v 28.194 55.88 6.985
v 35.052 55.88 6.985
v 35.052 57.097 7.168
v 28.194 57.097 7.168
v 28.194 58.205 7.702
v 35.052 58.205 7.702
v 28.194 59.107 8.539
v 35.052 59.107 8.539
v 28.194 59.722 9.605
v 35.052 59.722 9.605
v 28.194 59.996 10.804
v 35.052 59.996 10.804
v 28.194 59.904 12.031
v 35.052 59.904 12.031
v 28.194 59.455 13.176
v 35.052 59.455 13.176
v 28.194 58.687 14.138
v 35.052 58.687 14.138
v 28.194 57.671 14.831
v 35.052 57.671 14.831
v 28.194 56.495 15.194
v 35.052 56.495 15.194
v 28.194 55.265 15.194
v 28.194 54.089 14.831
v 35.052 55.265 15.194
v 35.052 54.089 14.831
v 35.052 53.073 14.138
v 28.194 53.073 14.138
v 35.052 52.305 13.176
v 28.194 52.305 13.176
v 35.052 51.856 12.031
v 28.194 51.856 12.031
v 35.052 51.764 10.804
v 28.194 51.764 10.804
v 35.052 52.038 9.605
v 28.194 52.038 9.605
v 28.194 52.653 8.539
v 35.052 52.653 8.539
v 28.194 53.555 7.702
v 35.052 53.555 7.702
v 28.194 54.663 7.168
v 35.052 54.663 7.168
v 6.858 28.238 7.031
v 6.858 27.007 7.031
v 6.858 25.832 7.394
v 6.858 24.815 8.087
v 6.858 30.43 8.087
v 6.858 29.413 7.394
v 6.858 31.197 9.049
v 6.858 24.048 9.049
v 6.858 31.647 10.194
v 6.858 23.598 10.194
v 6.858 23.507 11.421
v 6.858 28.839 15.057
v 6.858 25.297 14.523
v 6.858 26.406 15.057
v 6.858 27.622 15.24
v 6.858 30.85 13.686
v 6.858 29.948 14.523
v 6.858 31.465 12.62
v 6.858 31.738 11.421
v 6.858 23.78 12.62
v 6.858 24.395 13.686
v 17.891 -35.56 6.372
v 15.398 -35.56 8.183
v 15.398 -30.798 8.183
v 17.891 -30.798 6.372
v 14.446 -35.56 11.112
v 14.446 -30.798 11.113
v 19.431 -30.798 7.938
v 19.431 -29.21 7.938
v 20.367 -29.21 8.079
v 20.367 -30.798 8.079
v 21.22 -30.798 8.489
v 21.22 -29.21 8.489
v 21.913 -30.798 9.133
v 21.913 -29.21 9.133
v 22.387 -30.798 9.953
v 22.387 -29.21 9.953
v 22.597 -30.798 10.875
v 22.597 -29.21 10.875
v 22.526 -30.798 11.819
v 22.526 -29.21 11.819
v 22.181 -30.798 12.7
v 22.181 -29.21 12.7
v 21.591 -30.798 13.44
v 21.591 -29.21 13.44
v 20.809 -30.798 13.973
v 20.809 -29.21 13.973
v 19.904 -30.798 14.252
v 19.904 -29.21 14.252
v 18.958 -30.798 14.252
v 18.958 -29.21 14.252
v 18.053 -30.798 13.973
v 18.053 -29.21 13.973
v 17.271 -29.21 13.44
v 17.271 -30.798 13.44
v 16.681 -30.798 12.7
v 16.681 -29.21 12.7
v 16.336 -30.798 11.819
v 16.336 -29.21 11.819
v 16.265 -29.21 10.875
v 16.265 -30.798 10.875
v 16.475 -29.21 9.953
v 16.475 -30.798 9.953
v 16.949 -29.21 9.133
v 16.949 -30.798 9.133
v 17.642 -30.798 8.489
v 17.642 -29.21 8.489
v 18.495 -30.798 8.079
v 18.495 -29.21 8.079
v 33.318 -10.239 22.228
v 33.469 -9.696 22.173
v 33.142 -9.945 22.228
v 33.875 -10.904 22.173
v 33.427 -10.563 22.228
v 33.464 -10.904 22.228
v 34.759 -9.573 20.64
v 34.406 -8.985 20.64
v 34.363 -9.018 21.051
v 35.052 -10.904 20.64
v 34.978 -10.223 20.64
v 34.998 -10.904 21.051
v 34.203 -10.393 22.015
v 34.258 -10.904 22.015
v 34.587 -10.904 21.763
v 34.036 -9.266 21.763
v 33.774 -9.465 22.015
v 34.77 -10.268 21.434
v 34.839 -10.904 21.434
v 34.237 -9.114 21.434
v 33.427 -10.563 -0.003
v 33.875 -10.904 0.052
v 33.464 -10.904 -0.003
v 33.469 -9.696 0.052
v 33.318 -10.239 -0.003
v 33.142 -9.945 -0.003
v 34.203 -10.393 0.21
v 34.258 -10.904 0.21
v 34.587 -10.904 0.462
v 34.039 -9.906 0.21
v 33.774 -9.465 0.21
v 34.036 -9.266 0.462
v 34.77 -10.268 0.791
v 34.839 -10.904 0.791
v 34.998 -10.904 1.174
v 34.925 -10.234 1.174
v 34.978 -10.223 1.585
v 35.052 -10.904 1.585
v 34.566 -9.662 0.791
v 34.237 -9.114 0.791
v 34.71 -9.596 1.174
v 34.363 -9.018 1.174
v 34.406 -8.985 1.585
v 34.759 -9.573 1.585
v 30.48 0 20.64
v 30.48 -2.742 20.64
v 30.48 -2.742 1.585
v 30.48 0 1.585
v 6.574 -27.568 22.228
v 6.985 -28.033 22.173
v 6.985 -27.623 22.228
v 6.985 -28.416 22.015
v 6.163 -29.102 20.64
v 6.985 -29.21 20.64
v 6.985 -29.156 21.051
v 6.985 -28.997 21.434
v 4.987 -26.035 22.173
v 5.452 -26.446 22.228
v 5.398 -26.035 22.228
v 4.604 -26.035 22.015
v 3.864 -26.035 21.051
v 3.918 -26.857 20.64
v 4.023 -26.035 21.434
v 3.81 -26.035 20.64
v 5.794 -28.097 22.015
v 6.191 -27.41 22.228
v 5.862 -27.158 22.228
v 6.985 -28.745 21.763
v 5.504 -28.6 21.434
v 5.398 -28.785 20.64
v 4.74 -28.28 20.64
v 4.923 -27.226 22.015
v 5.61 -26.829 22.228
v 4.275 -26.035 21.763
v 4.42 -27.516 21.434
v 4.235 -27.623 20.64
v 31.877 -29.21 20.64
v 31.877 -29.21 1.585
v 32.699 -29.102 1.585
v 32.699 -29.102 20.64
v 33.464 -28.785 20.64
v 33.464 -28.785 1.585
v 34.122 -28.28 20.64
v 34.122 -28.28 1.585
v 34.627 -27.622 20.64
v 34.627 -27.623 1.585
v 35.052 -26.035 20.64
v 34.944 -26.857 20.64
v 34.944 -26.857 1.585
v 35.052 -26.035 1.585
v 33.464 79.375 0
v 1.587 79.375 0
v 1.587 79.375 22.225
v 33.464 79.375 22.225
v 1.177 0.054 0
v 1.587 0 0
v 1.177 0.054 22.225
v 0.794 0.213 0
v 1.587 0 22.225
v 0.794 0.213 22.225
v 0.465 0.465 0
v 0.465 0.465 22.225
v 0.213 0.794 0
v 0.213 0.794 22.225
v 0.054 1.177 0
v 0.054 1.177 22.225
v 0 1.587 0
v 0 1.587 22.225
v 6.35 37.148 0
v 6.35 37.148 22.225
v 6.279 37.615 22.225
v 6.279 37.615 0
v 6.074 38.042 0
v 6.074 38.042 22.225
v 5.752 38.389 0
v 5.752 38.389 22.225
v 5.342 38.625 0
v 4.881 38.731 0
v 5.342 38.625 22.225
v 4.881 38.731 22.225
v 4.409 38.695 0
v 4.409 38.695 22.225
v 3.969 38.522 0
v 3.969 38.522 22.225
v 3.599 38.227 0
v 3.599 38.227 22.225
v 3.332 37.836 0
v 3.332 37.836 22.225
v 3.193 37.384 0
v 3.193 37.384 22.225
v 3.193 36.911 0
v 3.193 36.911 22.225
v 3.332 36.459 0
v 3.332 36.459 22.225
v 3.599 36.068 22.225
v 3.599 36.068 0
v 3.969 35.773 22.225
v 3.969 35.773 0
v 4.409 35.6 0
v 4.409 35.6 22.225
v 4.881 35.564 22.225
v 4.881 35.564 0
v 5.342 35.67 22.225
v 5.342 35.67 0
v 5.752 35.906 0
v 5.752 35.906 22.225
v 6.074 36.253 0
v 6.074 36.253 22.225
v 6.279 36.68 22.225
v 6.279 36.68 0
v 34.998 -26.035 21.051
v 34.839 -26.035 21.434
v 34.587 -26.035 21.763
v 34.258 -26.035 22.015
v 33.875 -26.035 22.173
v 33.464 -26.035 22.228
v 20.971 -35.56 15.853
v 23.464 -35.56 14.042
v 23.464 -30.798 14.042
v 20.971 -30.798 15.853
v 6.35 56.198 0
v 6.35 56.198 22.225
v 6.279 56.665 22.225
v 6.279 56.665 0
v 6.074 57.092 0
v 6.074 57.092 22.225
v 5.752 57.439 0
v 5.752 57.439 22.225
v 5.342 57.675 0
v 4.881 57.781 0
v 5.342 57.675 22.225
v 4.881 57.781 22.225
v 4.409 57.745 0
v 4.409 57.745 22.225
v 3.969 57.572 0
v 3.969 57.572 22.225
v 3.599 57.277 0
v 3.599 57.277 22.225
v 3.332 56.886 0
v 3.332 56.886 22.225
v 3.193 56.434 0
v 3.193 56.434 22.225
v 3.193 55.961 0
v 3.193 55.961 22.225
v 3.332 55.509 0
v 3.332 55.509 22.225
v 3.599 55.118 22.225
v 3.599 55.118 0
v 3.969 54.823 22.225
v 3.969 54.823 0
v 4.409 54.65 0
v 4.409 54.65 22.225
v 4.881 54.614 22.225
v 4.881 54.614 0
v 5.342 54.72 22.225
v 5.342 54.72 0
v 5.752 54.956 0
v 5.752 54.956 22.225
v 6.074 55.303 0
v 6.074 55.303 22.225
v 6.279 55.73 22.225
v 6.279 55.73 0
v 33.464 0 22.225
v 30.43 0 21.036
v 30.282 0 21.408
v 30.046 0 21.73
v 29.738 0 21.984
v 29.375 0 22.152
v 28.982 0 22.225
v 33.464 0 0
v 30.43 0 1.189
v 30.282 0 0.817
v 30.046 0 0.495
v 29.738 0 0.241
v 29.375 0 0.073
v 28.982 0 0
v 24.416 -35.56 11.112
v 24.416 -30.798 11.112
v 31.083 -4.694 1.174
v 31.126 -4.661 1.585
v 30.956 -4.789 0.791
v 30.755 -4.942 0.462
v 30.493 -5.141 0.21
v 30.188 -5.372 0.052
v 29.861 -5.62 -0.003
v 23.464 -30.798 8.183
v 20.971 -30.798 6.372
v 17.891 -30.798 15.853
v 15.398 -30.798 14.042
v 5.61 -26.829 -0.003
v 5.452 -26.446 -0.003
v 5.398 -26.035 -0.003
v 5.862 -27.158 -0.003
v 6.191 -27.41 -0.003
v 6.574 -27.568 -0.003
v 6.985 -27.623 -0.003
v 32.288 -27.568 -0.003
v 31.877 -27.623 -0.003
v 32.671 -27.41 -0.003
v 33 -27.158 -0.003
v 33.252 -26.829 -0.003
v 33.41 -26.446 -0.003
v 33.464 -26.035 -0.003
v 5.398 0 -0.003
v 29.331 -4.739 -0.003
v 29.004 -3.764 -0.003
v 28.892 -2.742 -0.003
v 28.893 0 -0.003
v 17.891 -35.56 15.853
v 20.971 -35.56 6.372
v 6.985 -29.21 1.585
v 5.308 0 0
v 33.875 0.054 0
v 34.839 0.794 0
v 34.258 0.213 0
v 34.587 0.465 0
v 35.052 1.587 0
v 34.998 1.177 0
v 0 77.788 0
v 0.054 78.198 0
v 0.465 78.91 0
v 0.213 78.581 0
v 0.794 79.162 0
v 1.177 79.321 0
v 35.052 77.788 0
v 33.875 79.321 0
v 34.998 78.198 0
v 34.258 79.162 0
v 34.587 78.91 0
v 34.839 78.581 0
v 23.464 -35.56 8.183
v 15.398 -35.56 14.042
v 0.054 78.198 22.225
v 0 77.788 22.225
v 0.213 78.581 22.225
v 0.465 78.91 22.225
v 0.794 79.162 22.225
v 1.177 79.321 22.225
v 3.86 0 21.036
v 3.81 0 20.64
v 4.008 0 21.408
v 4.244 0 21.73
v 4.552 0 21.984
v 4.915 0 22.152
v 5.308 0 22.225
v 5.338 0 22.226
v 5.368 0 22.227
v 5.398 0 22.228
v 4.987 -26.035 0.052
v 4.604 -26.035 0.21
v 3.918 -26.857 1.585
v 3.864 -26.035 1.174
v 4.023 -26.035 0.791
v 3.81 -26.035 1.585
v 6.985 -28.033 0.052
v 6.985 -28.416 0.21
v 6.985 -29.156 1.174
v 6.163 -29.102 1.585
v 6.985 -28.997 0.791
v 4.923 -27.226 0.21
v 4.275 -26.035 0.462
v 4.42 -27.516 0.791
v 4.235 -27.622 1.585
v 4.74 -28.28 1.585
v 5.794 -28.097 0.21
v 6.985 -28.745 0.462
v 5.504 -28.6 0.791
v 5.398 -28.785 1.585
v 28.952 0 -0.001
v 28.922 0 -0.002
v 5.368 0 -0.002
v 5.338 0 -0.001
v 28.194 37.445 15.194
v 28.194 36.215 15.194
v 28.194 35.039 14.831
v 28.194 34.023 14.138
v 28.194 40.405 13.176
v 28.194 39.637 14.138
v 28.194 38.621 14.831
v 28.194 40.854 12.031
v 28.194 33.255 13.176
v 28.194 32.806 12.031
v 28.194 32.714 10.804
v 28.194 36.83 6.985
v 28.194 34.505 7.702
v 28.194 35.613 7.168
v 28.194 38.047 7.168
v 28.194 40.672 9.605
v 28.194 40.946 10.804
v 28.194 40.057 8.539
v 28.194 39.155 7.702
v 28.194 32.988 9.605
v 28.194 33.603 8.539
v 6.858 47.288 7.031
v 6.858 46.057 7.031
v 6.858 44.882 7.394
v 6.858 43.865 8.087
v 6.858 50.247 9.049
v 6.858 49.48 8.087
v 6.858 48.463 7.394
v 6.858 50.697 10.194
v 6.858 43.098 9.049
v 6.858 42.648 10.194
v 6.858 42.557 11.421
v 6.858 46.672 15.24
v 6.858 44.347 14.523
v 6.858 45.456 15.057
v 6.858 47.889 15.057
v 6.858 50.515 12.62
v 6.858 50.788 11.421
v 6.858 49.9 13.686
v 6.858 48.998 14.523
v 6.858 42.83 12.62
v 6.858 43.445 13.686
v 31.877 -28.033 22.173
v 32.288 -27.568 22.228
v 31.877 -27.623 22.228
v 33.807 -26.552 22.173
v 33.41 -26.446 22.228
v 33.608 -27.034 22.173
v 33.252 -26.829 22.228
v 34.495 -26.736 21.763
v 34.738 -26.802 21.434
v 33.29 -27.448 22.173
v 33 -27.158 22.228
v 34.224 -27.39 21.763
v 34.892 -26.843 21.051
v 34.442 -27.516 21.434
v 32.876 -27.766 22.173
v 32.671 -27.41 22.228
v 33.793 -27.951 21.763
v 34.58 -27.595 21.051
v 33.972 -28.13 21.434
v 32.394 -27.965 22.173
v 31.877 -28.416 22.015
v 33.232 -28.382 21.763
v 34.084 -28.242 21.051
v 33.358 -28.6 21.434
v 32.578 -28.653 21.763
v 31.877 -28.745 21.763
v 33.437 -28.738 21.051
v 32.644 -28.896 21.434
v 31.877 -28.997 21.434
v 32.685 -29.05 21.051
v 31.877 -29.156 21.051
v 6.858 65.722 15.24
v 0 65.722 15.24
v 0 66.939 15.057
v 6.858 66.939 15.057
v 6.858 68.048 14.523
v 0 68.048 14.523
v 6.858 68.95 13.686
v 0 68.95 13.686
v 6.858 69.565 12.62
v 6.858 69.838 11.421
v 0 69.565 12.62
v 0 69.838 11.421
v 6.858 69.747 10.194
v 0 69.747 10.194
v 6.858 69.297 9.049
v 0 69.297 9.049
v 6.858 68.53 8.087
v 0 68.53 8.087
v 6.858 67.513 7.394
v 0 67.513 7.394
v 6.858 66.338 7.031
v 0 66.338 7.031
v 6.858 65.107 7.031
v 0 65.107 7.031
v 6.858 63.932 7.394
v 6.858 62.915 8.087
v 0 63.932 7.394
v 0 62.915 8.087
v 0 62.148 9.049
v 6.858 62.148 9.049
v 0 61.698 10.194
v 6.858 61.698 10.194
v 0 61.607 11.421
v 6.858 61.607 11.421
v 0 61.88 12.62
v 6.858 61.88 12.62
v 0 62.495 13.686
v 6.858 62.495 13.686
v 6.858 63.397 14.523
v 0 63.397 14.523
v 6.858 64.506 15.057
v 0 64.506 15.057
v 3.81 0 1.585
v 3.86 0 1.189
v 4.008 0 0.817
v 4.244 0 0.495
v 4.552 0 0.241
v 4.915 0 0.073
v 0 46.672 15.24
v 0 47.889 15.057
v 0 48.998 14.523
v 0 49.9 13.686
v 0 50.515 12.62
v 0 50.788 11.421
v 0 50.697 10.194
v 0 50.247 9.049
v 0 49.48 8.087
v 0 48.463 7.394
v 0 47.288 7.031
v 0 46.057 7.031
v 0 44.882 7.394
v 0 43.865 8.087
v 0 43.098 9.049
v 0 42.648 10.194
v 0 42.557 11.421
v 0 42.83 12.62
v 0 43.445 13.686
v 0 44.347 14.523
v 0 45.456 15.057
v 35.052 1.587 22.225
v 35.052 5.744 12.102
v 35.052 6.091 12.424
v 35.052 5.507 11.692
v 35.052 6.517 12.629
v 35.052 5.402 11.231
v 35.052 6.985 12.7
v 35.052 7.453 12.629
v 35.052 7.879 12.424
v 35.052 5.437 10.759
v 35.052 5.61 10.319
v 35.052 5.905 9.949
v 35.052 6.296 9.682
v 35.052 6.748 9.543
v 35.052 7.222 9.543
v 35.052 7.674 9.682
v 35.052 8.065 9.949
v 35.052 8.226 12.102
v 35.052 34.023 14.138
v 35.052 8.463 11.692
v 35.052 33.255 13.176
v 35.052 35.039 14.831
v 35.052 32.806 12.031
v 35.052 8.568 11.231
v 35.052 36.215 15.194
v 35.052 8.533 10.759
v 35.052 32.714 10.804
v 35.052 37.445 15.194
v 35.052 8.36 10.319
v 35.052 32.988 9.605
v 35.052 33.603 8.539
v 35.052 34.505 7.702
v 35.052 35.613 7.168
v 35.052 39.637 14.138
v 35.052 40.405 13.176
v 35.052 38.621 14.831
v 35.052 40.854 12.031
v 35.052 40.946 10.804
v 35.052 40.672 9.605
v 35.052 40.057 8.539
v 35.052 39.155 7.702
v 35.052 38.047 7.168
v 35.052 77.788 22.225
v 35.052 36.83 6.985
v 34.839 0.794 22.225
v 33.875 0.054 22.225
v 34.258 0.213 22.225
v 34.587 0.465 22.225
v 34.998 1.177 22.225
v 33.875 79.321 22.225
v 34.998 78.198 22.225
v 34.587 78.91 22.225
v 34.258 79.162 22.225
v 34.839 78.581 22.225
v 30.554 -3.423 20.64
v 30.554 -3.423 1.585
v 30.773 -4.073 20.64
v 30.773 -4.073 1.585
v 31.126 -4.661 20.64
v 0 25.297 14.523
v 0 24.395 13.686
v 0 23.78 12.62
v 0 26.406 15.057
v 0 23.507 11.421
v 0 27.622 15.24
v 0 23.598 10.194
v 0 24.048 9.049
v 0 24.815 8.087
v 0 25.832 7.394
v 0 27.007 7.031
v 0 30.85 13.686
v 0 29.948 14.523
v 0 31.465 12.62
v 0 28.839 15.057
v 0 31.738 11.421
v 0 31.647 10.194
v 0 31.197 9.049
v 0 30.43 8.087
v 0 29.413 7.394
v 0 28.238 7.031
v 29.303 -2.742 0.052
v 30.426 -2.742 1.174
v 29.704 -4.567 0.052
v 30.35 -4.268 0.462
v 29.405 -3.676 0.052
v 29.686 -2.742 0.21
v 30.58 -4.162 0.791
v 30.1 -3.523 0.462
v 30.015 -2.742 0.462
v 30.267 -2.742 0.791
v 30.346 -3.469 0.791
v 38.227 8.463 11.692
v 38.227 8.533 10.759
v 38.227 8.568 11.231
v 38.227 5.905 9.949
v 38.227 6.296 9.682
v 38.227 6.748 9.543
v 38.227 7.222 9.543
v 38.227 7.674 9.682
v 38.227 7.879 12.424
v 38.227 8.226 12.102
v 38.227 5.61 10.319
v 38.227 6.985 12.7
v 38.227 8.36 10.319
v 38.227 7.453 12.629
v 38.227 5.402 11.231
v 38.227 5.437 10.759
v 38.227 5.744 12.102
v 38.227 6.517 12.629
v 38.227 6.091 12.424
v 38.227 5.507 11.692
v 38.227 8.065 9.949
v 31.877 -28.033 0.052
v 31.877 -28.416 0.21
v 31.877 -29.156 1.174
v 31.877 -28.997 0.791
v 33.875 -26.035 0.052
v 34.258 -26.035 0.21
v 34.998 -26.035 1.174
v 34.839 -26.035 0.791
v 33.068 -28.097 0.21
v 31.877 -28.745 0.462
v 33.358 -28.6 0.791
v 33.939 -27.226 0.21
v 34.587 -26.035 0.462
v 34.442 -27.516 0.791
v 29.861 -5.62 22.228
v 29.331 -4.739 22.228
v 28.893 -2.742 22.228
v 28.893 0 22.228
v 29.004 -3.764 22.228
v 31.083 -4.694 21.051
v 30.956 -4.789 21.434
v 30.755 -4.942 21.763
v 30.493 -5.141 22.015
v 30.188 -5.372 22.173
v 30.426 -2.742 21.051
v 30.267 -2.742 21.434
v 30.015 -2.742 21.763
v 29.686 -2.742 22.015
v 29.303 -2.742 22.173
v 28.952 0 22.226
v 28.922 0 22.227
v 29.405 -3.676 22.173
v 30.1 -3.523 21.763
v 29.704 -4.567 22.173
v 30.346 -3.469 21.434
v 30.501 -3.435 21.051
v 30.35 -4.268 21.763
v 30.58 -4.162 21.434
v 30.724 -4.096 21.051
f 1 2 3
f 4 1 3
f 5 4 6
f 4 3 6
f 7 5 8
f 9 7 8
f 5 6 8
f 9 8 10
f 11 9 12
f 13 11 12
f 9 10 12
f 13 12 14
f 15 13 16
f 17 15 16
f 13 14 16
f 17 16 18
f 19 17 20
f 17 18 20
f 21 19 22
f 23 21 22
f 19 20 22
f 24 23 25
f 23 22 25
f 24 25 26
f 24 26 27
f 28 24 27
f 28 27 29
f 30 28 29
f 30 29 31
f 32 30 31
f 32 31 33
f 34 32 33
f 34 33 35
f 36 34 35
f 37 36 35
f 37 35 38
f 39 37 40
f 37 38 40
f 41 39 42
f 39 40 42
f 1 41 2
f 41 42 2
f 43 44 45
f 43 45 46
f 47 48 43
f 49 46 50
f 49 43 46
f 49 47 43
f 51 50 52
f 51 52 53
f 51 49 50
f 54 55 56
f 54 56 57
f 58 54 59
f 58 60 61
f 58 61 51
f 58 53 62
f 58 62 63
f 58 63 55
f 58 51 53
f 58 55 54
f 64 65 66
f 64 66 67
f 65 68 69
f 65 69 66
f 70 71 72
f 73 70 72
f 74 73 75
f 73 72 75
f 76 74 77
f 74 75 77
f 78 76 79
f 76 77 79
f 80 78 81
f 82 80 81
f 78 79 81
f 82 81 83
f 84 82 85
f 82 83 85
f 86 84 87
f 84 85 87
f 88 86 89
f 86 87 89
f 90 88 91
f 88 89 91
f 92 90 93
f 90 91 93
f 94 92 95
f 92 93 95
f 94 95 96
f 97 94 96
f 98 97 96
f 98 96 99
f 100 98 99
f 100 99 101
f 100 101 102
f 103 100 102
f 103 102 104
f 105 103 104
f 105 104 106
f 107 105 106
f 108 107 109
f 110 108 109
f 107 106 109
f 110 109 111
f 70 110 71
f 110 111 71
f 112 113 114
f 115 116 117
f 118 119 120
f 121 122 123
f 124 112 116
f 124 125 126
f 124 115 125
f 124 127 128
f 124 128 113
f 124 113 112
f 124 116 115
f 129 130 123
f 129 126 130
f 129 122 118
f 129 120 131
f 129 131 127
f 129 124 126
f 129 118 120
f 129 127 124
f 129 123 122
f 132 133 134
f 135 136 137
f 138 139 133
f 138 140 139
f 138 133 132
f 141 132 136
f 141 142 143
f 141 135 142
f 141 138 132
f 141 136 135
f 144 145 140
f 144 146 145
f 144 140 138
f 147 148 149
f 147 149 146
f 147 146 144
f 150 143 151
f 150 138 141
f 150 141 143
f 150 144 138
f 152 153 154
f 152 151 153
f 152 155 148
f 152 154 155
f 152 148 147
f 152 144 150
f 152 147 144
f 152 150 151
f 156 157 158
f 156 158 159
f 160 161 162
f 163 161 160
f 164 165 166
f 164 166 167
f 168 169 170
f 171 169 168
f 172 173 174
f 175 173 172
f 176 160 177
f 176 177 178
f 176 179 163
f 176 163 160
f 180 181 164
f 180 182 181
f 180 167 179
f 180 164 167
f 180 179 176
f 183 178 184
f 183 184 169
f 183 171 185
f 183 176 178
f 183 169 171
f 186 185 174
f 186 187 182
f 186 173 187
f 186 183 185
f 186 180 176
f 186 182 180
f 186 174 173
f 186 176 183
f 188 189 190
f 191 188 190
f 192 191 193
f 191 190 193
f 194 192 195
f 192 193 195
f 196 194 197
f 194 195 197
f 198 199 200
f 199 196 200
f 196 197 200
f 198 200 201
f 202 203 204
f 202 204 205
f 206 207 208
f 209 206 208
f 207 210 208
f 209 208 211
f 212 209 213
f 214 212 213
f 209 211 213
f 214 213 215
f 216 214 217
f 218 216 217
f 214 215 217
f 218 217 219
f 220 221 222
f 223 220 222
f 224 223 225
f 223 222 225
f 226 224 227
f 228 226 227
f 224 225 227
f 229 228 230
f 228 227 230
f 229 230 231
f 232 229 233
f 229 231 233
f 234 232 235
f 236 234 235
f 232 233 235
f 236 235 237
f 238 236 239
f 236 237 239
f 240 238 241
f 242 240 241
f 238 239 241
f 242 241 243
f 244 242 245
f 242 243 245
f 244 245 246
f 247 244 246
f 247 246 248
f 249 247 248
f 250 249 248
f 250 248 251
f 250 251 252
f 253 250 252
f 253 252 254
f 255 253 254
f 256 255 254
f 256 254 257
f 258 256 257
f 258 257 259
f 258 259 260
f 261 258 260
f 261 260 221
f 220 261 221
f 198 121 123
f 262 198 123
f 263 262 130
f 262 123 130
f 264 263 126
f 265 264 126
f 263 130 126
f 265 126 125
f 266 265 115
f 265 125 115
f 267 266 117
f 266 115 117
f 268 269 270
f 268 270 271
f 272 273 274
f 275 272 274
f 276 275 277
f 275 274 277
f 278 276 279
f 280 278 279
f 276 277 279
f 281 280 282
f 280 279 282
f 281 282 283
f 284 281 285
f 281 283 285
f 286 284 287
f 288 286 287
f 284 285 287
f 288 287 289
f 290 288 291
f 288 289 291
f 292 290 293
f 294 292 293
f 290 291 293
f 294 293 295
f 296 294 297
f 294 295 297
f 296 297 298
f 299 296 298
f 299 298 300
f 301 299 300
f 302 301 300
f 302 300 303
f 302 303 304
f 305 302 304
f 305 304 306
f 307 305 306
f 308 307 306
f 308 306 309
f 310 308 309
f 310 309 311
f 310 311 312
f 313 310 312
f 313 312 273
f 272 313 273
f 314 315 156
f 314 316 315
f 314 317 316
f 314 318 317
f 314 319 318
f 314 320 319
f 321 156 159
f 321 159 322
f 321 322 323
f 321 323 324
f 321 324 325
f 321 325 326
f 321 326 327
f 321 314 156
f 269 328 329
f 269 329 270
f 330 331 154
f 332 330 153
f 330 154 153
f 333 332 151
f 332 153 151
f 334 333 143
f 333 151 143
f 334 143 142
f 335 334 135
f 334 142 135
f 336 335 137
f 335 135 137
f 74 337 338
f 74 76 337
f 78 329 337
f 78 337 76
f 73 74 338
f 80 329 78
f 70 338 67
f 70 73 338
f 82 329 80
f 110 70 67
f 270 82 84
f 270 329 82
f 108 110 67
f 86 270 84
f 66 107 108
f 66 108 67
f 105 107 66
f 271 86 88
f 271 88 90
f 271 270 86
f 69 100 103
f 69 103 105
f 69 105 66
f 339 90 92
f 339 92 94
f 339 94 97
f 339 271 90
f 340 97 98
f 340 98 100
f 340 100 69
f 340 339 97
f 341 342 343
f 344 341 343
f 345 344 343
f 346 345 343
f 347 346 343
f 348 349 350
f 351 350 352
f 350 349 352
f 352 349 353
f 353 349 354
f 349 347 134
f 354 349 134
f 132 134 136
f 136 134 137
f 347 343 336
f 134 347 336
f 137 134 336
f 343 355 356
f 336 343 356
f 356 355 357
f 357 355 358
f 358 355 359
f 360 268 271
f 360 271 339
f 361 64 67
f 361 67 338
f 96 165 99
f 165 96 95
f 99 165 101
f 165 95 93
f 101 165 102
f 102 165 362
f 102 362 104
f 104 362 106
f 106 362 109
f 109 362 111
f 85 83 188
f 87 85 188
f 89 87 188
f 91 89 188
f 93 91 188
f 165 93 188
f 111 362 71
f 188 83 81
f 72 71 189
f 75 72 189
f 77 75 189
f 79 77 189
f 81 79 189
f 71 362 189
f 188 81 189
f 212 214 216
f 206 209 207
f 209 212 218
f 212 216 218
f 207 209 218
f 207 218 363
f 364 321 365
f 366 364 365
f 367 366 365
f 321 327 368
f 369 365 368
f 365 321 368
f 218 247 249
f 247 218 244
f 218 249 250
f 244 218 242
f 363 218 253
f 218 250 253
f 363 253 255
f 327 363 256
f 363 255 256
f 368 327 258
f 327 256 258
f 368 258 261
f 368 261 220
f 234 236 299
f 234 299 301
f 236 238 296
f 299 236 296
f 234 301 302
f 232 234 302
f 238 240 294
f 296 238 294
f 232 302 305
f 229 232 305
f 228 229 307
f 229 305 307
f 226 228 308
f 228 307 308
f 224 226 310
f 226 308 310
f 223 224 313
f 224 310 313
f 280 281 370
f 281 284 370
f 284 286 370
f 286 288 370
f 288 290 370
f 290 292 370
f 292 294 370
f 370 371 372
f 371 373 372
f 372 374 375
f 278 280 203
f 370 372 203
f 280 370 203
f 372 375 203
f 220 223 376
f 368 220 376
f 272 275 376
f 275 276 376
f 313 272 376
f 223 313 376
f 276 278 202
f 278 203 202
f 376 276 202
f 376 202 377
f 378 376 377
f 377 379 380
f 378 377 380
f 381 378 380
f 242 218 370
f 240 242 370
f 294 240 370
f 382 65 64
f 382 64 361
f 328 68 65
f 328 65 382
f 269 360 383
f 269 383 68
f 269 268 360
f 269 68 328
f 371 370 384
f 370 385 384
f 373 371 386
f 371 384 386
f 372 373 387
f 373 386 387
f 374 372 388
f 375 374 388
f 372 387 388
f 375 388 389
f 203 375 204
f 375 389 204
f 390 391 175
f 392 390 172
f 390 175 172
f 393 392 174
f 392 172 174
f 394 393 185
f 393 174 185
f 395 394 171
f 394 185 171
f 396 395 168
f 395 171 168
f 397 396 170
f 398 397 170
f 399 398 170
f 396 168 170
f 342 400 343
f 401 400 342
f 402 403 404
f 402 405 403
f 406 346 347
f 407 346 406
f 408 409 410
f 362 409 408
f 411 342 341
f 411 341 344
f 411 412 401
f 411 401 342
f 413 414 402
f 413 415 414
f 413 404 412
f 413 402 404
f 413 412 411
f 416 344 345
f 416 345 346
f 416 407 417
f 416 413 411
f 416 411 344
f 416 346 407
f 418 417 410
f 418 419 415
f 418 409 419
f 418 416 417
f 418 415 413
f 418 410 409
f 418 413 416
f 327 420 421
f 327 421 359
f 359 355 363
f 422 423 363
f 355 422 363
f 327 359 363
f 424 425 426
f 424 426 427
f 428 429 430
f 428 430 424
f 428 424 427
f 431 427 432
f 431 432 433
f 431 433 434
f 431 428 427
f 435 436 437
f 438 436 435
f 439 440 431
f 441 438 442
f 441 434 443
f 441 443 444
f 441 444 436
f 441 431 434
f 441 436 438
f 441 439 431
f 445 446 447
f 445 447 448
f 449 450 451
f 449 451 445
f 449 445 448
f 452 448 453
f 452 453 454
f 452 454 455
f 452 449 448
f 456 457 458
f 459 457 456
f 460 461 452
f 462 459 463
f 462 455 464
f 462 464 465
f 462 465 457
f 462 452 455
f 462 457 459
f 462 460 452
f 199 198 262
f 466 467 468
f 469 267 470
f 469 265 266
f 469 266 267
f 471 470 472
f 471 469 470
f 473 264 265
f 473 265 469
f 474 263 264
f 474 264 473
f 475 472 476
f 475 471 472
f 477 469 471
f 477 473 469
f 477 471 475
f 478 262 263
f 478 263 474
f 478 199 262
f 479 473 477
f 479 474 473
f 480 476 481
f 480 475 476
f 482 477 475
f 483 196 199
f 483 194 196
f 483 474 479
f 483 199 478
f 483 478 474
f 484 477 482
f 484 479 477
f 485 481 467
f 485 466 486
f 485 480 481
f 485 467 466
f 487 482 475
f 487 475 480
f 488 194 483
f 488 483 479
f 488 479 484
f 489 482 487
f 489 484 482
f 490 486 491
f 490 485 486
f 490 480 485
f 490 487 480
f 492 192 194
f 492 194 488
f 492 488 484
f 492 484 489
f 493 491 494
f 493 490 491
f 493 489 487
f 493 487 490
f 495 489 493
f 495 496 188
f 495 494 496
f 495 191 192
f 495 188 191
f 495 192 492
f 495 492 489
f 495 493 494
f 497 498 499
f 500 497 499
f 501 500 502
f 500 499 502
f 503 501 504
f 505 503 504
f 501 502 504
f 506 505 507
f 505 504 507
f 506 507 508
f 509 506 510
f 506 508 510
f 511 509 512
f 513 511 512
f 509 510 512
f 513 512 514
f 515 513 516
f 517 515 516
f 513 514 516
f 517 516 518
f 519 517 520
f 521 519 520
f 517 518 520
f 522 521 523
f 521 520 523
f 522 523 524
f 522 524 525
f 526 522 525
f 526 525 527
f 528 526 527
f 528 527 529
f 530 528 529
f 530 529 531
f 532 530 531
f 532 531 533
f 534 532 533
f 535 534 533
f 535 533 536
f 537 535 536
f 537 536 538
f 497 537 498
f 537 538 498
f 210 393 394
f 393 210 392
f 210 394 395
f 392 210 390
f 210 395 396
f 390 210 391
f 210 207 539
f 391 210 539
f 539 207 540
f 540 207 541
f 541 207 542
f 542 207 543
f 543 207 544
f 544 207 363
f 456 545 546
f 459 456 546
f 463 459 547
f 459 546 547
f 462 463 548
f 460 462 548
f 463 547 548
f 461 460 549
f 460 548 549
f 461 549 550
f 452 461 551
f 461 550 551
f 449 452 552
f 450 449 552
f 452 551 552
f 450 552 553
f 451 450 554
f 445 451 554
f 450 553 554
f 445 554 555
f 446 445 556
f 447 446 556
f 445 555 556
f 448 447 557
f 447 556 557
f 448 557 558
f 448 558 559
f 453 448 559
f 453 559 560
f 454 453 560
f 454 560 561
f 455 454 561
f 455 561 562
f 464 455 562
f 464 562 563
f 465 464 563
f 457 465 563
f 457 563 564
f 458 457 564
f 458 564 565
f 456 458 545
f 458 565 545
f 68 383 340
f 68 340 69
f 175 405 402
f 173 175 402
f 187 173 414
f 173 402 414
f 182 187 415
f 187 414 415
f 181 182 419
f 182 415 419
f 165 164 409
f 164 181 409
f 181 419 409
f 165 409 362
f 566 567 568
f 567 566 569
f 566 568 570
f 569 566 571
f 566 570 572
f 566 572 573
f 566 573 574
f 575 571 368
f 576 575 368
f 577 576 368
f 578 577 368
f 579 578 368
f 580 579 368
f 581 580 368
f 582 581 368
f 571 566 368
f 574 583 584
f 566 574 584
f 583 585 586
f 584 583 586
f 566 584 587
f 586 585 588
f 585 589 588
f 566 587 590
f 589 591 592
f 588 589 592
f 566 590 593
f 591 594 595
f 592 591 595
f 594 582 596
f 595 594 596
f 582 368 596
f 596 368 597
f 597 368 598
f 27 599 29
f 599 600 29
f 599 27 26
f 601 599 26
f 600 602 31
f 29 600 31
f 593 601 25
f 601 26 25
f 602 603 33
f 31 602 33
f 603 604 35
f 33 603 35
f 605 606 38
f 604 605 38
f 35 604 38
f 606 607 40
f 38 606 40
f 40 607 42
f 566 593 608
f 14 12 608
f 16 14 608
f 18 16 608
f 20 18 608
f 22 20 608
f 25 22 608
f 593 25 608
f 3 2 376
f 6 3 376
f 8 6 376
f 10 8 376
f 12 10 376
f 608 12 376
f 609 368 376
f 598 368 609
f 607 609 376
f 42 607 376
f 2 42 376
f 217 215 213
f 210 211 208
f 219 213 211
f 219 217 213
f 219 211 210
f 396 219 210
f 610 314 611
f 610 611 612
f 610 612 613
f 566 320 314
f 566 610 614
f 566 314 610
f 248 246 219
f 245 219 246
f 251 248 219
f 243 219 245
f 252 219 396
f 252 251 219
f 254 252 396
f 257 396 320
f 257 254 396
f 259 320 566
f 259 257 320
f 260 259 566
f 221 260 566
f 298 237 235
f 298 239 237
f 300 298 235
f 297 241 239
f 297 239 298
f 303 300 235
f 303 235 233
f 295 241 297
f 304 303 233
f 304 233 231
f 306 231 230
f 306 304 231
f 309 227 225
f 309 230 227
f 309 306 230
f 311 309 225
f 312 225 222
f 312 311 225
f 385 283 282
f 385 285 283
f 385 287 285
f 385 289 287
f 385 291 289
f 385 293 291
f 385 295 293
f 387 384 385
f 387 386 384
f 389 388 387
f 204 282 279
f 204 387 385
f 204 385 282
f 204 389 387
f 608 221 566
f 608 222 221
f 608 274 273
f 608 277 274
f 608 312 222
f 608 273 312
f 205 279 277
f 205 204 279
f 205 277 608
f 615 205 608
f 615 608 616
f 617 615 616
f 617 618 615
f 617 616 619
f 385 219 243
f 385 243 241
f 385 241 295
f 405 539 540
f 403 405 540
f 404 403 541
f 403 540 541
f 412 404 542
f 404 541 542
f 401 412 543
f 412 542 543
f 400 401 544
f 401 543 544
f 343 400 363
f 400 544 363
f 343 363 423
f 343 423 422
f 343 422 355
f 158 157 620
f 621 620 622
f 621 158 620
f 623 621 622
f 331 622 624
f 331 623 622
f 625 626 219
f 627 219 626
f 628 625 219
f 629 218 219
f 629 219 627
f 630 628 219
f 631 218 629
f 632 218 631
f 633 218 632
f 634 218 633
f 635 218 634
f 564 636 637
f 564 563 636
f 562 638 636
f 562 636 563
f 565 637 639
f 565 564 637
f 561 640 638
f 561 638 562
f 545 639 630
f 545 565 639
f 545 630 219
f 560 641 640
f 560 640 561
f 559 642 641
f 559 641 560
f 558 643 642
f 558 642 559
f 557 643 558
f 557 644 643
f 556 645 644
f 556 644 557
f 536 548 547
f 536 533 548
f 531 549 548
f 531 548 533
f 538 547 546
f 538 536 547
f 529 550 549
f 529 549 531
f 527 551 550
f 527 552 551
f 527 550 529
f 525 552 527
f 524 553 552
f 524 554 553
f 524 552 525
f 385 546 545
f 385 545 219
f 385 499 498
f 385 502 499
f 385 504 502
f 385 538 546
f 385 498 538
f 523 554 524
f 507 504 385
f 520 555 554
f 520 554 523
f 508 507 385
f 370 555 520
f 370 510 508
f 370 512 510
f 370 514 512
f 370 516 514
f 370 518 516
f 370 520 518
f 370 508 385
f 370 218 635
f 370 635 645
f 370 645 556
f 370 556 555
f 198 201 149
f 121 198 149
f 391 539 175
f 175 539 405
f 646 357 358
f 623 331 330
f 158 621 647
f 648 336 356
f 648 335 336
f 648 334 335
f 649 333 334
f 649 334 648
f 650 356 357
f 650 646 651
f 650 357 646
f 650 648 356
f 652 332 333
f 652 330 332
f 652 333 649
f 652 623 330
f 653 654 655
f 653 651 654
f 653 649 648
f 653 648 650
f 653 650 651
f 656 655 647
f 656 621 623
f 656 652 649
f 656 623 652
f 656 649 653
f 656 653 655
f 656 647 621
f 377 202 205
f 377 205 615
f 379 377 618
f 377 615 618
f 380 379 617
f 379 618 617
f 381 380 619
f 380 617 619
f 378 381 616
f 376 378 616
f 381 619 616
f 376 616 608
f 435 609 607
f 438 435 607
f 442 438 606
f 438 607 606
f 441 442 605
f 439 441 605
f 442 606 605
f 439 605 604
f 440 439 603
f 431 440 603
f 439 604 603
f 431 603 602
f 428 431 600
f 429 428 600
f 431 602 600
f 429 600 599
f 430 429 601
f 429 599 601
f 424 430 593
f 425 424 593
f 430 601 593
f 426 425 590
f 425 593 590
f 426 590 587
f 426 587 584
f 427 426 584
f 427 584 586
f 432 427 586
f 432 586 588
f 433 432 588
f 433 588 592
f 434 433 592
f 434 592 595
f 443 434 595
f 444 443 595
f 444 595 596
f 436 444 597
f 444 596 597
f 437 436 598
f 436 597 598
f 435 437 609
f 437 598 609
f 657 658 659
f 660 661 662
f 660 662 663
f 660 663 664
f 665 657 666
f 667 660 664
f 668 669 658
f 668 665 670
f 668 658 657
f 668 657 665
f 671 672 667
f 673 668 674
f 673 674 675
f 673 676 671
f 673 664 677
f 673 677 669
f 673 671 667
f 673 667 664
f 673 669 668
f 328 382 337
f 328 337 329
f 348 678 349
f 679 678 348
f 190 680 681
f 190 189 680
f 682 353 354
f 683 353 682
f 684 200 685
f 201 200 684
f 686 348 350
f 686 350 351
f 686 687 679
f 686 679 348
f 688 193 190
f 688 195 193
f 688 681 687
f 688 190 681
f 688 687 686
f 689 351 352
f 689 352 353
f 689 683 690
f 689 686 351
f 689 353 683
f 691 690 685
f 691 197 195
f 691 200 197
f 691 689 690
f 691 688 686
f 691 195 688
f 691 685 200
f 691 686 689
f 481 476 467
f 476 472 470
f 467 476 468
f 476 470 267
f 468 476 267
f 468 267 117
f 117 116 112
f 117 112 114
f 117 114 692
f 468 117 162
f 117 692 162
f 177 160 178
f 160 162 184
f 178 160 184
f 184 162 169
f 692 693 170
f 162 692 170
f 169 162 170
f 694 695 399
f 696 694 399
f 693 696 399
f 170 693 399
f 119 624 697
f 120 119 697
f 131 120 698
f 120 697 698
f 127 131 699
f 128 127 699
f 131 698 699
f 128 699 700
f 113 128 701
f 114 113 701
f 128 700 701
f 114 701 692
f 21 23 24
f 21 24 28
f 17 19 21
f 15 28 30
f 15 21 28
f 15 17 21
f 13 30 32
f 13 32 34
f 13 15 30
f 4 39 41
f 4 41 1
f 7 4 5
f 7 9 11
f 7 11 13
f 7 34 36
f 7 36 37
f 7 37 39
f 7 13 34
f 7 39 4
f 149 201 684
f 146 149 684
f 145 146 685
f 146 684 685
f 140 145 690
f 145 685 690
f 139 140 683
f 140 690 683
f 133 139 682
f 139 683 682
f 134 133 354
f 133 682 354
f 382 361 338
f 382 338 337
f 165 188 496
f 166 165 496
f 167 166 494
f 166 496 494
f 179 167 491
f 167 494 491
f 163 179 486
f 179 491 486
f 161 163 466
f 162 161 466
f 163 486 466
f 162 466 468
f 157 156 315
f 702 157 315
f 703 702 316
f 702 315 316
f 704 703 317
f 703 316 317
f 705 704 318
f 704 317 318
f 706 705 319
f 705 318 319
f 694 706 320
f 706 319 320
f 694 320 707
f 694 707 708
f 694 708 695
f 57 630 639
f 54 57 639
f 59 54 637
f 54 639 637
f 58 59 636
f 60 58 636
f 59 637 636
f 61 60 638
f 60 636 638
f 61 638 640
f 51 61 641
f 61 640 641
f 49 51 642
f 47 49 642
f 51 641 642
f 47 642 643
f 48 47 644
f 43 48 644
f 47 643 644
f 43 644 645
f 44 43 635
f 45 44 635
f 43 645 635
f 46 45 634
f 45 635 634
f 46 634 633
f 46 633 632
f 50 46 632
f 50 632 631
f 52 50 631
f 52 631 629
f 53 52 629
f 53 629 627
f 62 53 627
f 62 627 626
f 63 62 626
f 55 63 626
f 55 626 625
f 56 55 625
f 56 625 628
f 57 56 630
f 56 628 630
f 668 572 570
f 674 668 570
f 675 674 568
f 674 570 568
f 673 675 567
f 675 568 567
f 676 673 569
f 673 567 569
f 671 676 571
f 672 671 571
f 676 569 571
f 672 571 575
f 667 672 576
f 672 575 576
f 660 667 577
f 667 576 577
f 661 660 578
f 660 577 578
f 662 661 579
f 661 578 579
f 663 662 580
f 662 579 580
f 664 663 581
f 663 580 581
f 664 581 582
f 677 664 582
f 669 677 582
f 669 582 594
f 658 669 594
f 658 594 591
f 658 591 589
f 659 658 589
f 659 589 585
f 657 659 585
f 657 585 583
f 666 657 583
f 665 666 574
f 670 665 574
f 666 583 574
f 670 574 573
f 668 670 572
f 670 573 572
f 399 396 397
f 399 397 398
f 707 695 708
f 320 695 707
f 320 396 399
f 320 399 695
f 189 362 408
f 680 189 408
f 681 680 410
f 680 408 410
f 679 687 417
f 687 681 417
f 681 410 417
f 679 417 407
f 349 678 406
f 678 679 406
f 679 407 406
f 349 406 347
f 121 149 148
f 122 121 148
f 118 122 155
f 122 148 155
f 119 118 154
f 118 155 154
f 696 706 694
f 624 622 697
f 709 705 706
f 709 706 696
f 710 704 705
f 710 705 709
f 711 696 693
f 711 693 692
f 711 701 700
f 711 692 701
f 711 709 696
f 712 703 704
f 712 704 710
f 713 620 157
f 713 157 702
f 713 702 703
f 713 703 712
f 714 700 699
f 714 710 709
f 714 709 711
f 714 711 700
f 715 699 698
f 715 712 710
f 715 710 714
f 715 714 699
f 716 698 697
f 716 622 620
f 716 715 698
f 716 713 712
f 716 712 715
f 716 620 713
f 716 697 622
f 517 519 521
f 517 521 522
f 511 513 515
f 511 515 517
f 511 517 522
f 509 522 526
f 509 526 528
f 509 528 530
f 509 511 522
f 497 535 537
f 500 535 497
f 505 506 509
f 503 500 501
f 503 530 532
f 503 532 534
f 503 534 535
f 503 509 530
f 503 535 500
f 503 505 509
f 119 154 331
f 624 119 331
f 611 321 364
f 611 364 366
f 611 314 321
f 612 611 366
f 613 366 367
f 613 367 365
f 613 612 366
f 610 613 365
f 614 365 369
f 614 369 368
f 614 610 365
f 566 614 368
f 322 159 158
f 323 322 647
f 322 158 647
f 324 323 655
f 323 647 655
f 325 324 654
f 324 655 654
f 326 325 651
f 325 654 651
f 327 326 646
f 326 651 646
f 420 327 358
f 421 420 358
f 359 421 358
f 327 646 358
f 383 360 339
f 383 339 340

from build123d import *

# Parameters (mm, degrees)
SKETCH2_W           = 35.052
SKETCH2_H           = 79.375
BOSS_EXTRUDE1_DEPTH = 22.225
SKETCH3_R           = 1.5875
BOSS_EXTRUDE2_DEPTH = 3.175
BOSS_EXTRUDE4_DEPTH = 22.225
FILLET2_R           = 3.175
BOSS_EXTRUDE5_DEPTH = 0.00254
BOSS_EXTRUDE6_START = 0.00254
BOSS_EXTRUDE6_DEPTH = 0.00254
BOSS_EXTRUDE7_DEPTH = 6.35
SKETCH8_R           = 7.441189758
SKETCH8_R_2         = 3.175
CUT_EXTRUDE2_DEPTH  = 1.5875
FILLET3_R           = 1.5875
FILLET5_R           = 1.5875
SKETCH9_R           = 4.1275
CUT_EXTRUDE3_DEPTH  = 6.858
SKETCH10_R          = 4.1275
CUT_EXTRUDE4_DEPTH  = 6.858
SKETCH11_R          = 1.5875
CUT_EXTRUDE5_DEPTH  = 91.861200127


with BuildPart() as part:
    # Sketch2 → Boss-Extrude1 (new body)
    with BuildSketch(Plane.XY):
        with Locations((17.526, 39.6875)):
            Rectangle(SKETCH2_W, SKETCH2_H)
    extrude(amount=BOSS_EXTRUDE1_DEPTH)

    # Sketch3 → Boss-Extrude2 (add)
    with BuildSketch(Plane(origin=(35.052, 0, 0), x_dir=(0, 0, -1), z_dir=(1, 0, 0))):
        with Locations(Location((-11.1125, 6.985, 0), (0, 0, 180))):
            Circle(SKETCH3_R)
    extrude(amount=BOSS_EXTRUDE2_DEPTH)

    # Sketch4 → Boss-Extrude4 (add)
    with BuildSketch(Plane.XY.offset(22.225)):
        Polygon((30.48, -3.81), (30.48, 0), (29.21, 0), (3.81, 0), (3.81, -29.21), (35.052, -29.21), (35.052, -9.836099718), align=None)
    extrude(amount=-BOSS_EXTRUDE4_DEPTH)

    # Fillet2
    fillet2_edges = [part.edges().sort_by_distance(p)[0] for p in [
        (30.48, -3.81, 11.1125),
        (35.052, -9.836099718, 11.1125),
        (35.052, -29.21, 11.1125),
        (3.81, -29.21, 11.1125),
    ]]
    fillet(fillet2_edges, radius=FILLET2_R)

    # Sketch5 → Boss-Extrude5 (add)
    with BuildSketch(Plane.XY.offset(22.225)):
        with BuildLine():
            Line((3.81, 0), (30.48, 0))
            Line((30.48, 0), (30.48, -2.741877551))
            ThreePointArc((30.48, -2.741877551), (30.64572555, -3.754247187), (31.125601437, -4.660931461))
            Line((31.125601437, -4.660931461), (34.406398563, -8.985168257))
            ThreePointArc((34.406398563, -8.985168257), (34.88627445, -9.891852531), (35.052, -10.904222168))
            Line((35.052, -10.904222168), (35.052, -26.035))
            ThreePointArc((35.052, -26.035), (34.12206403, -28.28006403), (31.877, -29.21))
            Line((31.877, -29.21), (6.985, -29.21))
            ThreePointArc((6.985, -29.21), (4.73993597, -28.28006403), (3.81, -26.035))
            Line((3.81, -26.035), (3.81, 0))
        make_face()
    extrude(amount=BOSS_EXTRUDE5_DEPTH)

    # Sketch6 → Boss-Extrude6 (add)
    with BuildSketch(Plane(origin=(0, 0, 0), x_dir=(-1, 0, 0), z_dir=(0, 0, -1)).offset(BOSS_EXTRUDE6_START)):
        with BuildLine():
            Line((-30.48, 0), (-3.81, 0))
            Line((-3.81, 0), (-3.81, -26.035))
            ThreePointArc((-3.81, -26.035), (-4.73993597, -28.28006403), (-6.985, -29.21))
            Line((-6.985, -29.21), (-31.877, -29.21))
            ThreePointArc((-31.877, -29.21), (-34.12206403, -28.28006403), (-35.052, -26.035))
            Line((-35.052, -26.035), (-35.052, -10.904222168))
            ThreePointArc((-35.052, -10.904222168), (-34.88627445, -9.891852531), (-34.406398563, -8.985168257))
            Line((-34.406398563, -8.985168257), (-31.125601437, -4.660931461))
            ThreePointArc((-31.125601437, -4.660931461), (-30.64572555, -3.754247187), (-30.48, -2.741877551))
            Line((-30.48, -2.741877551), (-30.48, 0))
        make_face()
    extrude(amount=-BOSS_EXTRUDE6_DEPTH)

    # Sketch7 → Boss-Extrude7 (add)
    with BuildSketch(Plane.XZ.offset(29.21)):
        Polygon((17.890627537, 15.85327897), (15.398252537, 14.042462536), (14.44625, 11.1125), (15.398252537, 8.182537464), (17.890627537, 6.37172103), (20.971372463, 6.37172103), (23.463747463, 8.182537464), (24.41575, 11.1125), (23.463747463, 14.042462536), (20.971372463, 15.85327897), align=None)
    extrude(amount=BOSS_EXTRUDE7_DEPTH)

    # Sketch8 → Cut-Extrude2 (cut)
    # profile 1 of 2: a face of its own
    with BuildSketch(Plane.XZ.offset(29.21)):
        with Locations((19.431, 11.1125)):
            Circle(SKETCH8_R)
        Polygon((14.44625, 11.1125), (15.398252537, 14.042462536), (17.890627537, 15.85327897), (20.971372463, 15.85327897), (23.463747463, 14.042462536), (24.41575, 11.1125), (23.463747463, 8.182537464), (20.971372463, 6.37172103), (17.890627537, 6.37172103), (15.398252537, 8.182537464), align=None, mode=Mode.SUBTRACT)
    # profile 2 of 2: a face of its own
    with BuildSketch(Plane.XZ.offset(29.21)):
        Polygon((15.398252537, 14.042462536), (17.890627537, 15.85327897), (20.971372463, 15.85327897), (23.463747463, 14.042462536), (24.41575, 11.1125), (23.463747463, 8.182537464), (20.971372463, 6.37172103), (17.890627537, 6.37172103), (15.398252537, 8.182537464), (14.44625, 11.1125), align=None)
        with Locations(Location((19.431, 11.1125, 0), (0, 0, 270))):
            Circle(SKETCH8_R_2, mode=Mode.SUBTRACT)
    extrude(amount=CUT_EXTRUDE2_DEPTH, mode=Mode.SUBTRACT)

    # Fillet3
    fillet3_edges = [part.edges().sort_by_distance(p)[0] for p in [
        (0, 79.375, 11.1125),
        (35.052, 79.375, 11.1125),
        (35.052, 0, 11.1125),
        (0, 0, 11.1125),
    ]]
    fillet(fillet3_edges, radius=FILLET3_R)

    # Fillet5
    # the kernel refuses this fillet: 1.5875 mm, written as the material it takes off along each edge
    with BuildSketch(Plane(origin=(30.48, -2.741877551, -0.00254), x_dir=(0, 0, 1), z_dir=(0, 1, 0)), Plane(origin=(30.48, 0, 22.22754), x_dir=(0, 0, -1), z_dir=(0, -1, 0))) as fillet5_piece_1:
        with BuildLine():
            CenterArc((FILLET5_R, -FILLET5_R), FILLET5_R, 90, 90)
            Line((0, -FILLET5_R), (0, 0))
            Line((0, 0), (FILLET5_R, 0))
        make_face()
    extrude(amount=2.741877551, mode=Mode.SUBTRACT)
    with BuildSketch(Plane(origin=(33.655, -2.741877551, -0.00254), x_dir=(-0.7966609646289196, -0.6044264284729114, 0), z_dir=(0.6044264284729114, -0.7966609646289196, 0))) as fillet5_piece_2:
        with BuildLine():
            CenterArc((3.175 + FILLET5_R, -FILLET5_R), FILLET5_R, 90, 90)
            Line((3.175, -FILLET5_R), (3.175, 0))
            Line((3.175, 0), (3.175 + FILLET5_R, 0))
        make_face()
    revolve(axis=Axis((33.655, -2.741877551, -0.00254), (0, 0, -1)), revolution_arc=37.18757939, mode=Mode.SUBTRACT)
    with BuildSketch(Plane(origin=(34.406398563, -8.985168257, -0.00254), x_dir=(-0.796660964628914, -0.6044264284729185, 0), z_dir=(-0.6044264284729186, 0.7966609646289141, 0)), Plane(origin=(31.125601437, -4.660931461, 22.22754), x_dir=(-0.7966609646289139, -0.6044264284729186, 0), z_dir=(0.6044264284729186, -0.796660964628914, 0))) as fillet5_piece_3:
        with BuildLine():
            CenterArc((FILLET5_R, FILLET5_R), FILLET5_R, 180, 90)
            Line((0, FILLET5_R), (0, 0))
            Line((0, 0), (FILLET5_R, 0))
        make_face()
    extrude(amount=5.427951146, mode=Mode.SUBTRACT)
    with BuildSketch(Plane(origin=(31.877, -10.904222168, -0.00254), x_dir=(1, 0, 0), z_dir=(0, -1, 0))) as fillet5_piece_4:
        with BuildLine():
            CenterArc((3.175 - FILLET5_R, FILLET5_R), FILLET5_R, 270, 90)
            Line((3.175, FILLET5_R), (3.175, 0))
            Line((3.175, 0), (3.175 - FILLET5_R, 0))
        make_face()
    revolve(axis=Axis((31.877, -10.904222168, -0.00254), (0, 0, 1)), revolution_arc=37.18757939, mode=Mode.SUBTRACT)
    with BuildSketch(Plane(origin=(35.052, -26.035, -0.00254), x_dir=(-1, 0, 0), z_dir=(0, 1, 0)), Plane(origin=(35.052, -10.904222168, 22.22754), x_dir=(-1, 0, 0), z_dir=(0, -1, 0))) as fillet5_piece_5:
        with BuildLine():
            CenterArc((FILLET5_R, FILLET5_R), FILLET5_R, 180, 90)
            Line((0, FILLET5_R), (0, 0))
            Line((0, 0), (FILLET5_R, 0))
        make_face()
    extrude(amount=15.130777832, mode=Mode.SUBTRACT)
    with BuildSketch(Plane(origin=(31.877, -26.035, -0.00254), x_dir=(0, -1, 0), z_dir=(-1, 0, 0))) as fillet5_piece_6:
        with BuildLine():
            CenterArc((3.175 - FILLET5_R, FILLET5_R), FILLET5_R, 270, 90)
            Line((3.175, FILLET5_R), (3.175, 0))
            Line((3.175, 0), (3.175 - FILLET5_R, 0))
        make_face()
    revolve(axis=Axis((31.877, -26.035, -0.00254), (0, 0, 1)), revolution_arc=90, mode=Mode.SUBTRACT)
    with BuildSketch(Plane(origin=(6.985, -29.21, -0.00254), x_dir=(0, 1, 0), z_dir=(1, 0, 0)), Plane(origin=(31.877, -29.21, 22.22754), x_dir=(0, 1, 0), z_dir=(-1, 0, 0))) as fillet5_piece_7:
        with BuildLine():
            CenterArc((FILLET5_R, FILLET5_R), FILLET5_R, 180, 90)
            Line((0, FILLET5_R), (0, 0))
            Line((0, 0), (FILLET5_R, 0))
        make_face()
    extrude(amount=24.892, mode=Mode.SUBTRACT)
    with BuildSketch(Plane(origin=(6.985, -26.035, -0.00254), x_dir=(-1, 0, 0), z_dir=(0, 1, 0))) as fillet5_piece_8:
        with BuildLine():
            CenterArc((3.175 - FILLET5_R, FILLET5_R), FILLET5_R, 270, 90)
            Line((3.175, FILLET5_R), (3.175, 0))
            Line((3.175, 0), (3.175 - FILLET5_R, 0))
        make_face()
    revolve(axis=Axis((6.985, -26.035, -0.00254), (0, 0, 1)), revolution_arc=90, mode=Mode.SUBTRACT)
    with BuildSketch(Plane(origin=(3.81, 0, -0.00254), x_dir=(0, 0, 1), z_dir=(0, -1, 0)), Plane(origin=(3.81, -26.035, 22.22754), x_dir=(0, 0, -1), z_dir=(0, 1, 0))) as fillet5_piece_9:
        with BuildLine():
            CenterArc((FILLET5_R, -FILLET5_R), FILLET5_R, 90, 90)
            Line((0, -FILLET5_R), (0, 0))
            Line((0, 0), (FILLET5_R, 0))
        make_face()
    extrude(amount=26.035, mode=Mode.SUBTRACT)
    with BuildSketch(Plane(origin=(6.985, -26.035, 22.22754), x_dir=(0, -1, 0), z_dir=(1, 0, 0))) as fillet5_piece_10:
        with BuildLine():
            CenterArc((3.175 - FILLET5_R, FILLET5_R), FILLET5_R, 270, 90)
            Line((3.175, FILLET5_R), (3.175, 0))
            Line((3.175, 0), (3.175 - FILLET5_R, 0))
        make_face()
    revolve(axis=Axis((6.985, -26.035, 22.22754), (0, 0, -1)), revolution_arc=90, mode=Mode.SUBTRACT)
    with BuildSketch(Plane(origin=(31.877, -26.035, 22.22754), x_dir=(1, 0, 0), z_dir=(0, 1, 0))) as fillet5_piece_11:
        with BuildLine():
            CenterArc((3.175 - FILLET5_R, FILLET5_R), FILLET5_R, 270, 90)
            Line((3.175, FILLET5_R), (3.175, 0))
            Line((3.175, 0), (3.175 - FILLET5_R, 0))
        make_face()
    revolve(axis=Axis((31.877, -26.035, 22.22754), (0, 0, -1)), revolution_arc=90, mode=Mode.SUBTRACT)
    with BuildSketch(Plane(origin=(31.877, -10.904222168, 22.22754), x_dir=(0.7966609646289129, 0.6044264284729202, 0), z_dir=(-0.6044264284729202, 0.7966609646289129, 0))) as fillet5_piece_12:
        with BuildLine():
            CenterArc((3.175 - FILLET5_R, FILLET5_R), FILLET5_R, 270, 90)
            Line((3.175, FILLET5_R), (3.175, 0))
            Line((3.175, 0), (3.175 - FILLET5_R, 0))
        make_face()
    revolve(axis=Axis((31.877, -10.904222168, 22.22754), (0, 0, -1)), revolution_arc=37.18757939, mode=Mode.SUBTRACT)
    with BuildSketch(Plane(origin=(33.655, -2.741877551, 22.22754), x_dir=(-1, 0, 0), z_dir=(0, 1, 0))) as fillet5_piece_13:
        with BuildLine():
            CenterArc((3.175 + FILLET5_R, -FILLET5_R), FILLET5_R, 90, 90)
            Line((3.175, -FILLET5_R), (3.175, 0))
            Line((3.175, 0), (3.175 + FILLET5_R, 0))
        make_face()
    revolve(axis=Axis((33.655, -2.741877551, 22.22754), (0, 0, 1)), revolution_arc=37.18757939, mode=Mode.SUBTRACT)

    # Sketch9 → Cut-Extrude3 (cut)
    with BuildSketch(Plane(origin=(35.052, 0, 0), x_dir=(0, 0, -1), z_dir=(1, 0, 0))):
        with Locations((-11.1125, 55.88)):
            Circle(SKETCH9_R)
        with Locations((-11.1125, 36.83)):
            Circle(SKETCH9_R)
    extrude(amount=-CUT_EXTRUDE3_DEPTH, mode=Mode.SUBTRACT)

    # Sketch10 → Cut-Extrude4 (cut)
    with BuildSketch(Plane.ZY):
        with Locations((11.1125, 65.7225)):
            Circle(SKETCH10_R)
        with Locations((11.1125, 46.6725)):
            Circle(SKETCH10_R)
        with Locations((11.1125, 27.6225)):
            Circle(SKETCH10_R)
    extrude(amount=-CUT_EXTRUDE4_DEPTH, mode=Mode.SUBTRACT)

    # Sketch11 → Cut-Extrude5 (cut, through all)
    with BuildSketch(Plane.XY.offset(22.225)):
        with Locations((4.7625, 56.1975)):
            Circle(SKETCH11_R)
        with Locations((4.7625, 37.1475)):
            Circle(SKETCH11_R)
    extrude(amount=-CUT_EXTRUDE5_DEPTH, mode=Mode.SUBTRACT)


solid = part.part
